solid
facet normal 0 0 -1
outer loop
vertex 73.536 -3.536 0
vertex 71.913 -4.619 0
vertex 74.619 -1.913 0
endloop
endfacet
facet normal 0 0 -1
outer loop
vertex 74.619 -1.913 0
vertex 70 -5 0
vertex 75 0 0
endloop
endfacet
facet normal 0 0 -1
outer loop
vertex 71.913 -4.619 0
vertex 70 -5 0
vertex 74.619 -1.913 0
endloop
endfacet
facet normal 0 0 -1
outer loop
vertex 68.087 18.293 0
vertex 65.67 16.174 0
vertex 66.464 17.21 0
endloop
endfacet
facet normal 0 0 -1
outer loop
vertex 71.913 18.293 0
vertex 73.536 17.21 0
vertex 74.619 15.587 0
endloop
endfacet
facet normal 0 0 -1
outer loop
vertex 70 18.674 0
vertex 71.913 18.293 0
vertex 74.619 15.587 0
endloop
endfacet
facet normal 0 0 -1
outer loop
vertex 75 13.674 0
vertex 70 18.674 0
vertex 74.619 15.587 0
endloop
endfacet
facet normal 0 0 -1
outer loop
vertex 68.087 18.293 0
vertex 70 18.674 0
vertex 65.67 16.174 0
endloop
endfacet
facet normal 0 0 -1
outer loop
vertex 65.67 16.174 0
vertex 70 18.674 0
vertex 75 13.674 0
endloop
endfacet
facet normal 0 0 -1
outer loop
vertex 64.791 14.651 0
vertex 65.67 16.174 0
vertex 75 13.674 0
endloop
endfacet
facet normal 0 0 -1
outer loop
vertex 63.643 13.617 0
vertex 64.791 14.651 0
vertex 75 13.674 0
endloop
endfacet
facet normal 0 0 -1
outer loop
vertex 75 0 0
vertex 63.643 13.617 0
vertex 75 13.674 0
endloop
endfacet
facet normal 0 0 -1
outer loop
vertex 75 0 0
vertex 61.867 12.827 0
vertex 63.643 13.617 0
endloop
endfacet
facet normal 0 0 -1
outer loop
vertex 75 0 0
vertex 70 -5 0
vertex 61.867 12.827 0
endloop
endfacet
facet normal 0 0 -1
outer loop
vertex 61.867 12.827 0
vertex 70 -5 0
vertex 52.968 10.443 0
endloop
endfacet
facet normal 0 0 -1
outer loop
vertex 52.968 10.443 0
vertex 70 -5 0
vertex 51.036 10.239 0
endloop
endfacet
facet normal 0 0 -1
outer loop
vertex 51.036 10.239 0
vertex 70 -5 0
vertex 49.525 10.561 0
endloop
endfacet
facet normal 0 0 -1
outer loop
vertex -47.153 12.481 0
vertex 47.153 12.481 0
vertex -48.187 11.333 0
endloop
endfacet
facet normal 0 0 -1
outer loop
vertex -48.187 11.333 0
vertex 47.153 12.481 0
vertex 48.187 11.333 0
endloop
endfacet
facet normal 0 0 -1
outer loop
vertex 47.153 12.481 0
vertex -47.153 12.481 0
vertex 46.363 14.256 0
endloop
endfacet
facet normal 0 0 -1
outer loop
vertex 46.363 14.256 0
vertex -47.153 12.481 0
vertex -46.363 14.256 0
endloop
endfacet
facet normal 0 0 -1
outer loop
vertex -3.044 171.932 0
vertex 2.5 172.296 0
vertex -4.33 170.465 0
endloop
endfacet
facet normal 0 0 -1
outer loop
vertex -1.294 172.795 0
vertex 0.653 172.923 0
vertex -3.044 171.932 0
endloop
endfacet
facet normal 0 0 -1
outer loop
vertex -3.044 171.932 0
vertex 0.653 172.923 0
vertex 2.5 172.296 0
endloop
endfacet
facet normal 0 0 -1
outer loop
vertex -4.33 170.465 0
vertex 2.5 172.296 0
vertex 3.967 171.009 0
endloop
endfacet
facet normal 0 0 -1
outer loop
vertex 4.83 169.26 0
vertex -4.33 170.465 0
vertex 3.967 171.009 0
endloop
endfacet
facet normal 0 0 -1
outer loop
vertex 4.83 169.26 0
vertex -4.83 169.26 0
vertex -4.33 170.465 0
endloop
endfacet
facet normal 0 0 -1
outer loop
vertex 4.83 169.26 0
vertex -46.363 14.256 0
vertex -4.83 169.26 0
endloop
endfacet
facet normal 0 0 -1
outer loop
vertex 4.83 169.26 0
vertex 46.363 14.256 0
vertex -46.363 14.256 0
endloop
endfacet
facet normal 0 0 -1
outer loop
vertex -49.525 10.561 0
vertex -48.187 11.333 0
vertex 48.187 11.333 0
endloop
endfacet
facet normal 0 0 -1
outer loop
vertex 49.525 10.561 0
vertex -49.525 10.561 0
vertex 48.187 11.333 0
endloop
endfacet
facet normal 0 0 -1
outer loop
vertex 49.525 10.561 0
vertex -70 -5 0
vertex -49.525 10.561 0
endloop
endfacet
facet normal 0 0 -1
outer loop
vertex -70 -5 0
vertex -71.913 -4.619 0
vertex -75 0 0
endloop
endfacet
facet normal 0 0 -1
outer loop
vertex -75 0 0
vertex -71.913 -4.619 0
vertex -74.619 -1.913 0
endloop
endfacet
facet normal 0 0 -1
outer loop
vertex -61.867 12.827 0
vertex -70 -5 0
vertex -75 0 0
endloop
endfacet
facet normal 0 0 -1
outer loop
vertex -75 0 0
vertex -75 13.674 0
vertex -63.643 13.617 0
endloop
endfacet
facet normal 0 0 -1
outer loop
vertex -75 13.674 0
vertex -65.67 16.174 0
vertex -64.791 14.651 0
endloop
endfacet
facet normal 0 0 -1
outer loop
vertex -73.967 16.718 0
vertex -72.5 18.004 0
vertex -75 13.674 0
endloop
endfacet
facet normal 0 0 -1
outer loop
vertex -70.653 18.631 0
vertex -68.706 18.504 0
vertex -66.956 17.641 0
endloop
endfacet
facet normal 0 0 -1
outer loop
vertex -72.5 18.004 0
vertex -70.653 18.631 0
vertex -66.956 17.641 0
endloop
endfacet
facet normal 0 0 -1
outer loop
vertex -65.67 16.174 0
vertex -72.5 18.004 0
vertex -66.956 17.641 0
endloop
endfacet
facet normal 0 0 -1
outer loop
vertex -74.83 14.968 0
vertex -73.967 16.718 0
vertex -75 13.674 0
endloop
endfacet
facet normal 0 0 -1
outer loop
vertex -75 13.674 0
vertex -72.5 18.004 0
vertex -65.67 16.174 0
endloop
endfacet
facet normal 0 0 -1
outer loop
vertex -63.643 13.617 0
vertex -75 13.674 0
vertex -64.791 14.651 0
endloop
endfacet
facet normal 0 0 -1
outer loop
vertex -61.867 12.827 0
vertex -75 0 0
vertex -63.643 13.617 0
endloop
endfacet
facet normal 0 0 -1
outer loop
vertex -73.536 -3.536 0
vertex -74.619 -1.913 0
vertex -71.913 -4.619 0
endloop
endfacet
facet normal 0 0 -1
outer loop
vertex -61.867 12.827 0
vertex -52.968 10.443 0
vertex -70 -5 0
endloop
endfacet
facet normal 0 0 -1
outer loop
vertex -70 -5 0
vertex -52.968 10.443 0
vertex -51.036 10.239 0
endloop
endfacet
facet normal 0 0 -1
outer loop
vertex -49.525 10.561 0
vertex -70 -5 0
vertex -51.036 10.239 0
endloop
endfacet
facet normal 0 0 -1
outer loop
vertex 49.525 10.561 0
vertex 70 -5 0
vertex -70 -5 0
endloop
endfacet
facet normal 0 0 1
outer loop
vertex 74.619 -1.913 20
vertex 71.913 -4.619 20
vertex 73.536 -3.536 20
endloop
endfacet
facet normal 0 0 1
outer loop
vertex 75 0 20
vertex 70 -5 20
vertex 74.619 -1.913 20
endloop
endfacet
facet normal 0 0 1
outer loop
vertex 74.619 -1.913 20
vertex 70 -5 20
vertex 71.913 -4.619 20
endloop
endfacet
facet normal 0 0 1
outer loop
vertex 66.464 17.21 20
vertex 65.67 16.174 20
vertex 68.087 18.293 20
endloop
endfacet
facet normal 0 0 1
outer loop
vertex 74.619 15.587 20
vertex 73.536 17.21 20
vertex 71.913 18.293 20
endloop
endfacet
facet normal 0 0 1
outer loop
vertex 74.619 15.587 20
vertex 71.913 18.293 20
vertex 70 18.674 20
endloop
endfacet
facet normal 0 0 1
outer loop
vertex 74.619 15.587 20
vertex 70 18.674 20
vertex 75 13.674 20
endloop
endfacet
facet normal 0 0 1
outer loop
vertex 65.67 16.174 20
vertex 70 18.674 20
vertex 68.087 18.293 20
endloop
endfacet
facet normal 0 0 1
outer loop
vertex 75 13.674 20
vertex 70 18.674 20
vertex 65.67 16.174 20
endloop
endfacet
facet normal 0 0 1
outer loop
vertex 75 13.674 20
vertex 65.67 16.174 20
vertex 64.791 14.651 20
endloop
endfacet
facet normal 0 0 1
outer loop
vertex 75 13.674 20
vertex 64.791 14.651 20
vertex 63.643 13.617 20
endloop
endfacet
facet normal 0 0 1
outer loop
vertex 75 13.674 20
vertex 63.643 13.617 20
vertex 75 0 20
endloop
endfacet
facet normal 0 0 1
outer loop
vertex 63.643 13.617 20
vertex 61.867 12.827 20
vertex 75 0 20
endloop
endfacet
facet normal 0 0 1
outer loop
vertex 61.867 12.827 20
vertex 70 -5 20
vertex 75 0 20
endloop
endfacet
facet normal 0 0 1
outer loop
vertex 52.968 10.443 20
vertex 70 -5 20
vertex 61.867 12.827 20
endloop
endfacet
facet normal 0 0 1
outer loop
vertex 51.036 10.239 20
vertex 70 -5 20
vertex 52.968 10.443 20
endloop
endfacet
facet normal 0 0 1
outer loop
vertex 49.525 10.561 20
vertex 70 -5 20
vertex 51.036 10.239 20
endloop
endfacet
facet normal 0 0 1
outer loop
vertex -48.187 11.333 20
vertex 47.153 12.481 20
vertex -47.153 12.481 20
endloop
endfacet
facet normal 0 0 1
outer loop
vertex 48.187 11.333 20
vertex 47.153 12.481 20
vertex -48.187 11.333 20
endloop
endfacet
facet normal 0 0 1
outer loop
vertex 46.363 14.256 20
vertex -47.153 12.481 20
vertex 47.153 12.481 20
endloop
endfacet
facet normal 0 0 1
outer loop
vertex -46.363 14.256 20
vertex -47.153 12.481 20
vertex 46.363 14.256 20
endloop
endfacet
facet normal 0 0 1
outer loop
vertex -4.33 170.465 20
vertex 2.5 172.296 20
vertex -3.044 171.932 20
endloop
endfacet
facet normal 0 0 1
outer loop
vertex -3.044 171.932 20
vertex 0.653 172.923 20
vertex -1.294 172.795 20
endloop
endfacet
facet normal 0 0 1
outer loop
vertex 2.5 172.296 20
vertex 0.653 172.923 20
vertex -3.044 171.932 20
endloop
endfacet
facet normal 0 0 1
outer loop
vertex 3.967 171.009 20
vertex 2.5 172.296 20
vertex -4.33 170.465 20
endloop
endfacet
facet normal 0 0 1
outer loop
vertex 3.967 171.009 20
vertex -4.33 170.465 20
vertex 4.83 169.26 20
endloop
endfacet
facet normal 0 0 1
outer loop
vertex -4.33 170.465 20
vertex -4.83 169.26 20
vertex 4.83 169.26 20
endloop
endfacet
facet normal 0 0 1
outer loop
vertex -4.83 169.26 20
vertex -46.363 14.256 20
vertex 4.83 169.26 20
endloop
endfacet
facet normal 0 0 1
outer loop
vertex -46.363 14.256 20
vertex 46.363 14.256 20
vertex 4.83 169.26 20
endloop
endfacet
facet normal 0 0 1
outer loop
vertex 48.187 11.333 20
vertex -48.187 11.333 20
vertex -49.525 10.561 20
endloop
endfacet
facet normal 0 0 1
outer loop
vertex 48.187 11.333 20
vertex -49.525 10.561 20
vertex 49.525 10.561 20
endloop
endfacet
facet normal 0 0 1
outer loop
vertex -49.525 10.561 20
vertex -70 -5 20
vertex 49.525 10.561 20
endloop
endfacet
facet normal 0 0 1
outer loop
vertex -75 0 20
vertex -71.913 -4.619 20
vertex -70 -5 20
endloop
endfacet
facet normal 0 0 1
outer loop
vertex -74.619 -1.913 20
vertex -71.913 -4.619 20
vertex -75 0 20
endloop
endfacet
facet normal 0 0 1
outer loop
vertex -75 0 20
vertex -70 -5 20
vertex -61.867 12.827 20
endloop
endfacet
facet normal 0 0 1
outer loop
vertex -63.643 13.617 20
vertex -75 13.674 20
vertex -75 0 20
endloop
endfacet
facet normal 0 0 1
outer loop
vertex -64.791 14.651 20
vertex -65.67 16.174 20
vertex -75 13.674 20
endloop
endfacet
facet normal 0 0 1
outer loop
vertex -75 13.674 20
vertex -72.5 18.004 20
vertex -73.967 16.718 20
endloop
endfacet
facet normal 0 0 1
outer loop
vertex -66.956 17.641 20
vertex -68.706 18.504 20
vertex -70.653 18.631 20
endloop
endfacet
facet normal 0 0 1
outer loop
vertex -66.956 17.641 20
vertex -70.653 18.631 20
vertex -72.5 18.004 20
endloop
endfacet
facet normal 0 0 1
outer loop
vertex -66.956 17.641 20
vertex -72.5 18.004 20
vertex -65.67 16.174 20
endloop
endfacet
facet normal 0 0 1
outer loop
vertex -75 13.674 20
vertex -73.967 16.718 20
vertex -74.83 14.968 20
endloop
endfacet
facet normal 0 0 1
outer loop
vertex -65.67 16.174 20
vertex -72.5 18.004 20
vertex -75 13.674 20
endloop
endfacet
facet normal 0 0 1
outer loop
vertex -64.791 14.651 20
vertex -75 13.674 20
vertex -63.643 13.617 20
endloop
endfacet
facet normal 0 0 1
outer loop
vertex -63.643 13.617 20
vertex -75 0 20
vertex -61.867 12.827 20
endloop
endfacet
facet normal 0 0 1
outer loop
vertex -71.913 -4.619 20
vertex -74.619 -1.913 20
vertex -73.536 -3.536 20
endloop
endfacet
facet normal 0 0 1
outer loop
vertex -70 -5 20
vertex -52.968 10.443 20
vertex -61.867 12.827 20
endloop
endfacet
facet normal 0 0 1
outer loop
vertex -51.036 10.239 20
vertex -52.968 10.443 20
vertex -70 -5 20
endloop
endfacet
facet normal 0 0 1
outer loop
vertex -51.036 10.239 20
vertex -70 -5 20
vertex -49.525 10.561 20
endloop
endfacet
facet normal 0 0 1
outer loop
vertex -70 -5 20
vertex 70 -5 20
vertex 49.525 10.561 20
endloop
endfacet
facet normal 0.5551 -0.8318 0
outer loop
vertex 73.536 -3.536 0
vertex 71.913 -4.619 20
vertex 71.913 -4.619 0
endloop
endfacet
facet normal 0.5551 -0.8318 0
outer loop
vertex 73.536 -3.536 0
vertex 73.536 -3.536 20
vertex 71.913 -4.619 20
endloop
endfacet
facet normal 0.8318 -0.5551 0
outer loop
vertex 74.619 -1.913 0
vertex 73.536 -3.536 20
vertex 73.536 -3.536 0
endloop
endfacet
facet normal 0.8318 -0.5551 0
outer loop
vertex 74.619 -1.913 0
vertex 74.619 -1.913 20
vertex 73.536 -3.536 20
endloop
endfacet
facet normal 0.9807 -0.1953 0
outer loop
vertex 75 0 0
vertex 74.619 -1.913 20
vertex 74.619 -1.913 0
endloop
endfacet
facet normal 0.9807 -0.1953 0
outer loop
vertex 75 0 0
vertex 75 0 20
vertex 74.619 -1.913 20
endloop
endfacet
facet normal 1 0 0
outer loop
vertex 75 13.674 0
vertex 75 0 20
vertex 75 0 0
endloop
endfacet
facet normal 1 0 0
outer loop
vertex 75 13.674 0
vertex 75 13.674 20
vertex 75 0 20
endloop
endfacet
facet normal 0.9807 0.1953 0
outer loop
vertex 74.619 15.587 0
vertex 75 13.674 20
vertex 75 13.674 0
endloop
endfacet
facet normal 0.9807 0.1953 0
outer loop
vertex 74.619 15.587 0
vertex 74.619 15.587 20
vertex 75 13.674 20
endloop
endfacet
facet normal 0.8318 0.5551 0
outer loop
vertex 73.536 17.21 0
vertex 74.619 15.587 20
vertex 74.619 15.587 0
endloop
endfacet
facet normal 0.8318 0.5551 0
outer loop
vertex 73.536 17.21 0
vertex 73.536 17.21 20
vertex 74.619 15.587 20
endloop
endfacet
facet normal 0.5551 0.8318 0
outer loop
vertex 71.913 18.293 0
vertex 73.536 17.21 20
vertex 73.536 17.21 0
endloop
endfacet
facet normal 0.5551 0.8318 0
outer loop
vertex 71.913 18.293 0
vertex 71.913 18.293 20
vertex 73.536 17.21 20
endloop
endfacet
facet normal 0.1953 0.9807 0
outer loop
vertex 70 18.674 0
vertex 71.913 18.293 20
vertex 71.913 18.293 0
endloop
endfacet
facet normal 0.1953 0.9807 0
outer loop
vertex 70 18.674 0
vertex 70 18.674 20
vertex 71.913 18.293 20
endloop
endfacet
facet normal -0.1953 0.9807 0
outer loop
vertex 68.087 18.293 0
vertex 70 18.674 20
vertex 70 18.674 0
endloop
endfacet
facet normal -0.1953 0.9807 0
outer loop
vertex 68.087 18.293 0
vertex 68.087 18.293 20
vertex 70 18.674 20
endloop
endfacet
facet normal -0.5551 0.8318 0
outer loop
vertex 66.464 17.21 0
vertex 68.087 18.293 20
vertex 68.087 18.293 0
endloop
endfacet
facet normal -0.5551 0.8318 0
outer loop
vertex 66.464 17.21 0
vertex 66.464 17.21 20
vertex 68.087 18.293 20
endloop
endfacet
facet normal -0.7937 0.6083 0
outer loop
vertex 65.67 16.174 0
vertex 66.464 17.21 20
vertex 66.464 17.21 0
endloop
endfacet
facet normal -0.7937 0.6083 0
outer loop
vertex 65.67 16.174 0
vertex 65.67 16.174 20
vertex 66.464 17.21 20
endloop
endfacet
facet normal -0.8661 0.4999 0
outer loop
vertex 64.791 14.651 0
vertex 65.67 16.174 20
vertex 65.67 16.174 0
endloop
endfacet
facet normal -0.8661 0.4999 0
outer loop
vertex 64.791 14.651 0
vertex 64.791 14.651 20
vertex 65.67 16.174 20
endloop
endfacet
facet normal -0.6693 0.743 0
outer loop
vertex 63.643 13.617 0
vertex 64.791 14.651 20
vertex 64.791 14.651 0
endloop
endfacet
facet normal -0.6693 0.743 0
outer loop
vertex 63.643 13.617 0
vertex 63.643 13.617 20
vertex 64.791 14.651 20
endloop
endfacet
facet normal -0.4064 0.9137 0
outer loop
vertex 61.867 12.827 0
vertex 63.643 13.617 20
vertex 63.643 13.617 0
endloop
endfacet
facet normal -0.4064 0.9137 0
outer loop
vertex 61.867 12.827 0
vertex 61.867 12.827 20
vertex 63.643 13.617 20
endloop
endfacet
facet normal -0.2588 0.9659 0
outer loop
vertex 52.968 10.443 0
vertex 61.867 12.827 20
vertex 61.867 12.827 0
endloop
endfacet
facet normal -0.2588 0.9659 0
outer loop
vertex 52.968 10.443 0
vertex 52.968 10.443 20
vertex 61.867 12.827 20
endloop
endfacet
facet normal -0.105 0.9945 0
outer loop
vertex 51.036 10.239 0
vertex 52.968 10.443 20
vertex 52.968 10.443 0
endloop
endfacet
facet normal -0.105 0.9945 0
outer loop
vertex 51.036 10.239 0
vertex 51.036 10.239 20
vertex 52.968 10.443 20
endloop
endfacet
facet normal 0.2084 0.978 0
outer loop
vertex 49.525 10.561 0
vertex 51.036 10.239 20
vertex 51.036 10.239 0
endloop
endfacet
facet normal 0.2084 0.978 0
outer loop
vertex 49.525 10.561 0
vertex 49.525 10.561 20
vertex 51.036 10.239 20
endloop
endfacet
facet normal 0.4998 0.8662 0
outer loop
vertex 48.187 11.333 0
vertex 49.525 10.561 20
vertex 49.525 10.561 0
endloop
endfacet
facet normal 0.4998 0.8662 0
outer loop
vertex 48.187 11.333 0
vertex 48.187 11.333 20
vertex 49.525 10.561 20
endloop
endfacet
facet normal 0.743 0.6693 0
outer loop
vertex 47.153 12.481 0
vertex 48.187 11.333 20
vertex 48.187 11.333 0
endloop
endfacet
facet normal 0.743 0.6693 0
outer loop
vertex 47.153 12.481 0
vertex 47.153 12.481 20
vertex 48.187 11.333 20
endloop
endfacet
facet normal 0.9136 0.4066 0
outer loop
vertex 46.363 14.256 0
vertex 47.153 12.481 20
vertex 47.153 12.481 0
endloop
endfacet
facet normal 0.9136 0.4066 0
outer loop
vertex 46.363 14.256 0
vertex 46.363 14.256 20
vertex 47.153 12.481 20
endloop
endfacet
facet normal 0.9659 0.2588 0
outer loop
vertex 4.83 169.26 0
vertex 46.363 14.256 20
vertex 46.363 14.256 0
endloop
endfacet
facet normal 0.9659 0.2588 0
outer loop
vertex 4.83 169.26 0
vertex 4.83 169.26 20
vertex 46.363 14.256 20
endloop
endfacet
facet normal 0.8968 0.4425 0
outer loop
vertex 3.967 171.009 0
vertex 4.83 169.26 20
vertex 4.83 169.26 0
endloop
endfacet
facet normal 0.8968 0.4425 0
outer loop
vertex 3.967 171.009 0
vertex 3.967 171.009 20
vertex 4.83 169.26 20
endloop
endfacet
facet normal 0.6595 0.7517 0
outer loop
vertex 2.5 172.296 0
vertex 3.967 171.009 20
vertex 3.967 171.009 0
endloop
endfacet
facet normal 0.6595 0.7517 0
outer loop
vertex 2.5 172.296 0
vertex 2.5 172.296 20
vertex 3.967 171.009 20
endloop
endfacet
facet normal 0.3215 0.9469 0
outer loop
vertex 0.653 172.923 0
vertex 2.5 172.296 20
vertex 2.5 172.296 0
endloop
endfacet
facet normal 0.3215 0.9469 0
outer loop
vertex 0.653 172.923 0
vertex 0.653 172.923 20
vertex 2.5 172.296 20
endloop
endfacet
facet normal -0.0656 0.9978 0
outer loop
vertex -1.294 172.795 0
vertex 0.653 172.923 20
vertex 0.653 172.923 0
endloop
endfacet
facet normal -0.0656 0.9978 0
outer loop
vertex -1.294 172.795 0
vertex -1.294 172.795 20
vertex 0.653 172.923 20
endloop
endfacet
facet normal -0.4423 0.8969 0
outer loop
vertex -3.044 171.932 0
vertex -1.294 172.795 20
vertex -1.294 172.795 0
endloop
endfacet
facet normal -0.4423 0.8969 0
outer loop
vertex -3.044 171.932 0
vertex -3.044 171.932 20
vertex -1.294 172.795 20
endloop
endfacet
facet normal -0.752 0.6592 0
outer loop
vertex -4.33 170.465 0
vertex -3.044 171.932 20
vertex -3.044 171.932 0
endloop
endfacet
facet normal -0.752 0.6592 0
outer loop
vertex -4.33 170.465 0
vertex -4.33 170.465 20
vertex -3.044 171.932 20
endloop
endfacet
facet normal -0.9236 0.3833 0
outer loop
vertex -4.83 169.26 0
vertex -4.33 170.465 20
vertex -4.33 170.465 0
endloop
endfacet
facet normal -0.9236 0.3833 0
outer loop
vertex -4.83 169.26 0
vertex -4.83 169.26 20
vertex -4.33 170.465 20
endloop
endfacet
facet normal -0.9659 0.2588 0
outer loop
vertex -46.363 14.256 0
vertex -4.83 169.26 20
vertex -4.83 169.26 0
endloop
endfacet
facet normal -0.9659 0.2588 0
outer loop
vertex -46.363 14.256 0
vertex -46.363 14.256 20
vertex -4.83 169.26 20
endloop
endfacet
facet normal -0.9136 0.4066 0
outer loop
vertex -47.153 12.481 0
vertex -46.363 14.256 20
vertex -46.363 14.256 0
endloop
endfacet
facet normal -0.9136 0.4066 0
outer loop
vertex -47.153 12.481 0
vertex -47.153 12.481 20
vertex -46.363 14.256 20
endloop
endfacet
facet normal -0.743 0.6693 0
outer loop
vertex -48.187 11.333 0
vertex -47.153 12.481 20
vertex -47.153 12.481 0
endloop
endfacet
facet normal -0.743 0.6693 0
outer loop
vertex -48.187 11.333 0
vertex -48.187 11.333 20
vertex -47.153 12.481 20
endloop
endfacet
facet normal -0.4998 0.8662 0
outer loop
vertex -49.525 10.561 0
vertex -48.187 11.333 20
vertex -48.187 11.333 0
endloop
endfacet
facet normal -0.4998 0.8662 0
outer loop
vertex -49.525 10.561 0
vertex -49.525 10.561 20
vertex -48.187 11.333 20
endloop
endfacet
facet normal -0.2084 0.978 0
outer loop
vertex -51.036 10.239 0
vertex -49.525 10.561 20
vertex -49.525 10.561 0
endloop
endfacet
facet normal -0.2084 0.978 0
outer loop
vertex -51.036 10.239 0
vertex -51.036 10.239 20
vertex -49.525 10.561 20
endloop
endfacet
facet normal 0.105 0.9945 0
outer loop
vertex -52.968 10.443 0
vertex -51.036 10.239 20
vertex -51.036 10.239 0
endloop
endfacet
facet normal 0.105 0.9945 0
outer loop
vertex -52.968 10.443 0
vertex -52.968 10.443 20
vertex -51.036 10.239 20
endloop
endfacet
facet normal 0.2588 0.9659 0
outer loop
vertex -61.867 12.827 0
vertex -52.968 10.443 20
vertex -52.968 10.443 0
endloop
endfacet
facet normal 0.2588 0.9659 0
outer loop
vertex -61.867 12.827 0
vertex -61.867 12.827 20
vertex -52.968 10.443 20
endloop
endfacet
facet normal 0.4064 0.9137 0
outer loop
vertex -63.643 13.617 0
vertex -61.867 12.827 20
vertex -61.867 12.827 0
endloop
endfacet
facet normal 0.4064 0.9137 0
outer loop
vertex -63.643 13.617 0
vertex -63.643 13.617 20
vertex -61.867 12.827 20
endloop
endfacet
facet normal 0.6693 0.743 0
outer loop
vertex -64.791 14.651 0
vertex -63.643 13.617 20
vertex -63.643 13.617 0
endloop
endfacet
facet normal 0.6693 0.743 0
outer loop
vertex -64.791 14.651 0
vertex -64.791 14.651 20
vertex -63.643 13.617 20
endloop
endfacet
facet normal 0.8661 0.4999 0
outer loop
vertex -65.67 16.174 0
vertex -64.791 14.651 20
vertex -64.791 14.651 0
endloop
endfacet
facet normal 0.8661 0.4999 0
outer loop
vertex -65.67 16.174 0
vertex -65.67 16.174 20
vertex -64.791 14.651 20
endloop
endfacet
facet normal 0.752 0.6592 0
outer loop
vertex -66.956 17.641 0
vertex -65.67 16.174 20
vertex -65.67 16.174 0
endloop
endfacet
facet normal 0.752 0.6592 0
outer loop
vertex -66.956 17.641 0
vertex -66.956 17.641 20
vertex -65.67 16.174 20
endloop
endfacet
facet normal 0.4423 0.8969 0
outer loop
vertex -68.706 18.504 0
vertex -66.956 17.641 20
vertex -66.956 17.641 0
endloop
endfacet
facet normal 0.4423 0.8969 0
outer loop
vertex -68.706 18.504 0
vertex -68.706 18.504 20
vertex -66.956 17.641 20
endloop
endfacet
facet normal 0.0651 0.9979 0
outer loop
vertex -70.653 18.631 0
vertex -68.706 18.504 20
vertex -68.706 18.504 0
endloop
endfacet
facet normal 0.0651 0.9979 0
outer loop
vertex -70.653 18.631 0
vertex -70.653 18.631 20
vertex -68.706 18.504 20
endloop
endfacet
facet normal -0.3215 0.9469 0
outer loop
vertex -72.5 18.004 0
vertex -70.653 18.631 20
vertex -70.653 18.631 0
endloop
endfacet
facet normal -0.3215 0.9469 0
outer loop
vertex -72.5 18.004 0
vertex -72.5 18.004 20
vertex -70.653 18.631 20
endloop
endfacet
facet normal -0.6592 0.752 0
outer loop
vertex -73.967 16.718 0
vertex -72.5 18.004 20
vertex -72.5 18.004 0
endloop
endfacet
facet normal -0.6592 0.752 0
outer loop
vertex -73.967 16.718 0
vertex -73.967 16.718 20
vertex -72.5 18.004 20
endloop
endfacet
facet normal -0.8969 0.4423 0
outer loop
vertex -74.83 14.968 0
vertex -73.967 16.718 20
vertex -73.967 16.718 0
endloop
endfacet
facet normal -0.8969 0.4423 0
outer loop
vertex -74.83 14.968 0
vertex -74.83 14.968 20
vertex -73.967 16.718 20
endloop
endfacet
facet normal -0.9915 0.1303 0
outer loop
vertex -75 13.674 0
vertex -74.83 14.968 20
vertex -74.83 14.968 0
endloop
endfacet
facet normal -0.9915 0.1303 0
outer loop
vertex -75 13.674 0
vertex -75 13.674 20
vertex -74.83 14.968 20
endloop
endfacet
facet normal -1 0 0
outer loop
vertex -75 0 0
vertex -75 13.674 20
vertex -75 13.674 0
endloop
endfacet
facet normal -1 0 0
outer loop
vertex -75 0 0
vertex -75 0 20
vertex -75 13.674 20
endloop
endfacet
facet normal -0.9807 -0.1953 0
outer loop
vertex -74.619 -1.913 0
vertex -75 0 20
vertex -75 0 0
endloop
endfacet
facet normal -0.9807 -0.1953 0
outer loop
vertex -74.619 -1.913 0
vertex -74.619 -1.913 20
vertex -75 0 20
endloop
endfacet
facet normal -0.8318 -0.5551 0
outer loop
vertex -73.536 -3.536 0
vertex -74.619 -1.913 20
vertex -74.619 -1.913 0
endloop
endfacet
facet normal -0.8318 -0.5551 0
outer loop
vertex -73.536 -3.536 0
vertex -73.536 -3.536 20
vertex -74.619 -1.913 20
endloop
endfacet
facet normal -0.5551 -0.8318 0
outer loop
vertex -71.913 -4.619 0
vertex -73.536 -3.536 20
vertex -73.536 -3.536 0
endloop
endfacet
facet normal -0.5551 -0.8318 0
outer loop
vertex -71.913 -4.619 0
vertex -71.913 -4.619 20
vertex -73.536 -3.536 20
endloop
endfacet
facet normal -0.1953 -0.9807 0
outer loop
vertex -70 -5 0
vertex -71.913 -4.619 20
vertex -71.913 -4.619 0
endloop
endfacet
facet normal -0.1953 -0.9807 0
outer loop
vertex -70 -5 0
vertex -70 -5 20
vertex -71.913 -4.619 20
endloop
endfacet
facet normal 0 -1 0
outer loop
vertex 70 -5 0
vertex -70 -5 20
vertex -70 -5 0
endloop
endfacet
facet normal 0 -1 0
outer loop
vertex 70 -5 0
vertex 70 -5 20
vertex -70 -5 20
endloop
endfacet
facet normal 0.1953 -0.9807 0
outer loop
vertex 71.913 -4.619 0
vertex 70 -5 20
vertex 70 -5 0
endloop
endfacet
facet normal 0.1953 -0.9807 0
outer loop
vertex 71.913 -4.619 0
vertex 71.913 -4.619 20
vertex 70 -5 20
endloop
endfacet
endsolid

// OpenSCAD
linear_extrude(20) {
offset(5) //minkowski()
{
//  circle(r=5,$fn=20);
  for(m=[0,1]) translate([0,0]) mirror([m,0]) translate([-30,0]) difference(){
  square([100,180]);
  translate([80,20]) rotate([0,0,15]) minkowski() {
    union() {
    square([100,180]);
      translate([0,-5]) square([10,10]);
    }
    circle(r=10,$fn=20);
  }
  //translate([-1,20]) rotate([0,0,5]) //minkowski()
  {
    square([30,190]);
    //circle(r=10,$fn=40);
  }
  }
}
}
